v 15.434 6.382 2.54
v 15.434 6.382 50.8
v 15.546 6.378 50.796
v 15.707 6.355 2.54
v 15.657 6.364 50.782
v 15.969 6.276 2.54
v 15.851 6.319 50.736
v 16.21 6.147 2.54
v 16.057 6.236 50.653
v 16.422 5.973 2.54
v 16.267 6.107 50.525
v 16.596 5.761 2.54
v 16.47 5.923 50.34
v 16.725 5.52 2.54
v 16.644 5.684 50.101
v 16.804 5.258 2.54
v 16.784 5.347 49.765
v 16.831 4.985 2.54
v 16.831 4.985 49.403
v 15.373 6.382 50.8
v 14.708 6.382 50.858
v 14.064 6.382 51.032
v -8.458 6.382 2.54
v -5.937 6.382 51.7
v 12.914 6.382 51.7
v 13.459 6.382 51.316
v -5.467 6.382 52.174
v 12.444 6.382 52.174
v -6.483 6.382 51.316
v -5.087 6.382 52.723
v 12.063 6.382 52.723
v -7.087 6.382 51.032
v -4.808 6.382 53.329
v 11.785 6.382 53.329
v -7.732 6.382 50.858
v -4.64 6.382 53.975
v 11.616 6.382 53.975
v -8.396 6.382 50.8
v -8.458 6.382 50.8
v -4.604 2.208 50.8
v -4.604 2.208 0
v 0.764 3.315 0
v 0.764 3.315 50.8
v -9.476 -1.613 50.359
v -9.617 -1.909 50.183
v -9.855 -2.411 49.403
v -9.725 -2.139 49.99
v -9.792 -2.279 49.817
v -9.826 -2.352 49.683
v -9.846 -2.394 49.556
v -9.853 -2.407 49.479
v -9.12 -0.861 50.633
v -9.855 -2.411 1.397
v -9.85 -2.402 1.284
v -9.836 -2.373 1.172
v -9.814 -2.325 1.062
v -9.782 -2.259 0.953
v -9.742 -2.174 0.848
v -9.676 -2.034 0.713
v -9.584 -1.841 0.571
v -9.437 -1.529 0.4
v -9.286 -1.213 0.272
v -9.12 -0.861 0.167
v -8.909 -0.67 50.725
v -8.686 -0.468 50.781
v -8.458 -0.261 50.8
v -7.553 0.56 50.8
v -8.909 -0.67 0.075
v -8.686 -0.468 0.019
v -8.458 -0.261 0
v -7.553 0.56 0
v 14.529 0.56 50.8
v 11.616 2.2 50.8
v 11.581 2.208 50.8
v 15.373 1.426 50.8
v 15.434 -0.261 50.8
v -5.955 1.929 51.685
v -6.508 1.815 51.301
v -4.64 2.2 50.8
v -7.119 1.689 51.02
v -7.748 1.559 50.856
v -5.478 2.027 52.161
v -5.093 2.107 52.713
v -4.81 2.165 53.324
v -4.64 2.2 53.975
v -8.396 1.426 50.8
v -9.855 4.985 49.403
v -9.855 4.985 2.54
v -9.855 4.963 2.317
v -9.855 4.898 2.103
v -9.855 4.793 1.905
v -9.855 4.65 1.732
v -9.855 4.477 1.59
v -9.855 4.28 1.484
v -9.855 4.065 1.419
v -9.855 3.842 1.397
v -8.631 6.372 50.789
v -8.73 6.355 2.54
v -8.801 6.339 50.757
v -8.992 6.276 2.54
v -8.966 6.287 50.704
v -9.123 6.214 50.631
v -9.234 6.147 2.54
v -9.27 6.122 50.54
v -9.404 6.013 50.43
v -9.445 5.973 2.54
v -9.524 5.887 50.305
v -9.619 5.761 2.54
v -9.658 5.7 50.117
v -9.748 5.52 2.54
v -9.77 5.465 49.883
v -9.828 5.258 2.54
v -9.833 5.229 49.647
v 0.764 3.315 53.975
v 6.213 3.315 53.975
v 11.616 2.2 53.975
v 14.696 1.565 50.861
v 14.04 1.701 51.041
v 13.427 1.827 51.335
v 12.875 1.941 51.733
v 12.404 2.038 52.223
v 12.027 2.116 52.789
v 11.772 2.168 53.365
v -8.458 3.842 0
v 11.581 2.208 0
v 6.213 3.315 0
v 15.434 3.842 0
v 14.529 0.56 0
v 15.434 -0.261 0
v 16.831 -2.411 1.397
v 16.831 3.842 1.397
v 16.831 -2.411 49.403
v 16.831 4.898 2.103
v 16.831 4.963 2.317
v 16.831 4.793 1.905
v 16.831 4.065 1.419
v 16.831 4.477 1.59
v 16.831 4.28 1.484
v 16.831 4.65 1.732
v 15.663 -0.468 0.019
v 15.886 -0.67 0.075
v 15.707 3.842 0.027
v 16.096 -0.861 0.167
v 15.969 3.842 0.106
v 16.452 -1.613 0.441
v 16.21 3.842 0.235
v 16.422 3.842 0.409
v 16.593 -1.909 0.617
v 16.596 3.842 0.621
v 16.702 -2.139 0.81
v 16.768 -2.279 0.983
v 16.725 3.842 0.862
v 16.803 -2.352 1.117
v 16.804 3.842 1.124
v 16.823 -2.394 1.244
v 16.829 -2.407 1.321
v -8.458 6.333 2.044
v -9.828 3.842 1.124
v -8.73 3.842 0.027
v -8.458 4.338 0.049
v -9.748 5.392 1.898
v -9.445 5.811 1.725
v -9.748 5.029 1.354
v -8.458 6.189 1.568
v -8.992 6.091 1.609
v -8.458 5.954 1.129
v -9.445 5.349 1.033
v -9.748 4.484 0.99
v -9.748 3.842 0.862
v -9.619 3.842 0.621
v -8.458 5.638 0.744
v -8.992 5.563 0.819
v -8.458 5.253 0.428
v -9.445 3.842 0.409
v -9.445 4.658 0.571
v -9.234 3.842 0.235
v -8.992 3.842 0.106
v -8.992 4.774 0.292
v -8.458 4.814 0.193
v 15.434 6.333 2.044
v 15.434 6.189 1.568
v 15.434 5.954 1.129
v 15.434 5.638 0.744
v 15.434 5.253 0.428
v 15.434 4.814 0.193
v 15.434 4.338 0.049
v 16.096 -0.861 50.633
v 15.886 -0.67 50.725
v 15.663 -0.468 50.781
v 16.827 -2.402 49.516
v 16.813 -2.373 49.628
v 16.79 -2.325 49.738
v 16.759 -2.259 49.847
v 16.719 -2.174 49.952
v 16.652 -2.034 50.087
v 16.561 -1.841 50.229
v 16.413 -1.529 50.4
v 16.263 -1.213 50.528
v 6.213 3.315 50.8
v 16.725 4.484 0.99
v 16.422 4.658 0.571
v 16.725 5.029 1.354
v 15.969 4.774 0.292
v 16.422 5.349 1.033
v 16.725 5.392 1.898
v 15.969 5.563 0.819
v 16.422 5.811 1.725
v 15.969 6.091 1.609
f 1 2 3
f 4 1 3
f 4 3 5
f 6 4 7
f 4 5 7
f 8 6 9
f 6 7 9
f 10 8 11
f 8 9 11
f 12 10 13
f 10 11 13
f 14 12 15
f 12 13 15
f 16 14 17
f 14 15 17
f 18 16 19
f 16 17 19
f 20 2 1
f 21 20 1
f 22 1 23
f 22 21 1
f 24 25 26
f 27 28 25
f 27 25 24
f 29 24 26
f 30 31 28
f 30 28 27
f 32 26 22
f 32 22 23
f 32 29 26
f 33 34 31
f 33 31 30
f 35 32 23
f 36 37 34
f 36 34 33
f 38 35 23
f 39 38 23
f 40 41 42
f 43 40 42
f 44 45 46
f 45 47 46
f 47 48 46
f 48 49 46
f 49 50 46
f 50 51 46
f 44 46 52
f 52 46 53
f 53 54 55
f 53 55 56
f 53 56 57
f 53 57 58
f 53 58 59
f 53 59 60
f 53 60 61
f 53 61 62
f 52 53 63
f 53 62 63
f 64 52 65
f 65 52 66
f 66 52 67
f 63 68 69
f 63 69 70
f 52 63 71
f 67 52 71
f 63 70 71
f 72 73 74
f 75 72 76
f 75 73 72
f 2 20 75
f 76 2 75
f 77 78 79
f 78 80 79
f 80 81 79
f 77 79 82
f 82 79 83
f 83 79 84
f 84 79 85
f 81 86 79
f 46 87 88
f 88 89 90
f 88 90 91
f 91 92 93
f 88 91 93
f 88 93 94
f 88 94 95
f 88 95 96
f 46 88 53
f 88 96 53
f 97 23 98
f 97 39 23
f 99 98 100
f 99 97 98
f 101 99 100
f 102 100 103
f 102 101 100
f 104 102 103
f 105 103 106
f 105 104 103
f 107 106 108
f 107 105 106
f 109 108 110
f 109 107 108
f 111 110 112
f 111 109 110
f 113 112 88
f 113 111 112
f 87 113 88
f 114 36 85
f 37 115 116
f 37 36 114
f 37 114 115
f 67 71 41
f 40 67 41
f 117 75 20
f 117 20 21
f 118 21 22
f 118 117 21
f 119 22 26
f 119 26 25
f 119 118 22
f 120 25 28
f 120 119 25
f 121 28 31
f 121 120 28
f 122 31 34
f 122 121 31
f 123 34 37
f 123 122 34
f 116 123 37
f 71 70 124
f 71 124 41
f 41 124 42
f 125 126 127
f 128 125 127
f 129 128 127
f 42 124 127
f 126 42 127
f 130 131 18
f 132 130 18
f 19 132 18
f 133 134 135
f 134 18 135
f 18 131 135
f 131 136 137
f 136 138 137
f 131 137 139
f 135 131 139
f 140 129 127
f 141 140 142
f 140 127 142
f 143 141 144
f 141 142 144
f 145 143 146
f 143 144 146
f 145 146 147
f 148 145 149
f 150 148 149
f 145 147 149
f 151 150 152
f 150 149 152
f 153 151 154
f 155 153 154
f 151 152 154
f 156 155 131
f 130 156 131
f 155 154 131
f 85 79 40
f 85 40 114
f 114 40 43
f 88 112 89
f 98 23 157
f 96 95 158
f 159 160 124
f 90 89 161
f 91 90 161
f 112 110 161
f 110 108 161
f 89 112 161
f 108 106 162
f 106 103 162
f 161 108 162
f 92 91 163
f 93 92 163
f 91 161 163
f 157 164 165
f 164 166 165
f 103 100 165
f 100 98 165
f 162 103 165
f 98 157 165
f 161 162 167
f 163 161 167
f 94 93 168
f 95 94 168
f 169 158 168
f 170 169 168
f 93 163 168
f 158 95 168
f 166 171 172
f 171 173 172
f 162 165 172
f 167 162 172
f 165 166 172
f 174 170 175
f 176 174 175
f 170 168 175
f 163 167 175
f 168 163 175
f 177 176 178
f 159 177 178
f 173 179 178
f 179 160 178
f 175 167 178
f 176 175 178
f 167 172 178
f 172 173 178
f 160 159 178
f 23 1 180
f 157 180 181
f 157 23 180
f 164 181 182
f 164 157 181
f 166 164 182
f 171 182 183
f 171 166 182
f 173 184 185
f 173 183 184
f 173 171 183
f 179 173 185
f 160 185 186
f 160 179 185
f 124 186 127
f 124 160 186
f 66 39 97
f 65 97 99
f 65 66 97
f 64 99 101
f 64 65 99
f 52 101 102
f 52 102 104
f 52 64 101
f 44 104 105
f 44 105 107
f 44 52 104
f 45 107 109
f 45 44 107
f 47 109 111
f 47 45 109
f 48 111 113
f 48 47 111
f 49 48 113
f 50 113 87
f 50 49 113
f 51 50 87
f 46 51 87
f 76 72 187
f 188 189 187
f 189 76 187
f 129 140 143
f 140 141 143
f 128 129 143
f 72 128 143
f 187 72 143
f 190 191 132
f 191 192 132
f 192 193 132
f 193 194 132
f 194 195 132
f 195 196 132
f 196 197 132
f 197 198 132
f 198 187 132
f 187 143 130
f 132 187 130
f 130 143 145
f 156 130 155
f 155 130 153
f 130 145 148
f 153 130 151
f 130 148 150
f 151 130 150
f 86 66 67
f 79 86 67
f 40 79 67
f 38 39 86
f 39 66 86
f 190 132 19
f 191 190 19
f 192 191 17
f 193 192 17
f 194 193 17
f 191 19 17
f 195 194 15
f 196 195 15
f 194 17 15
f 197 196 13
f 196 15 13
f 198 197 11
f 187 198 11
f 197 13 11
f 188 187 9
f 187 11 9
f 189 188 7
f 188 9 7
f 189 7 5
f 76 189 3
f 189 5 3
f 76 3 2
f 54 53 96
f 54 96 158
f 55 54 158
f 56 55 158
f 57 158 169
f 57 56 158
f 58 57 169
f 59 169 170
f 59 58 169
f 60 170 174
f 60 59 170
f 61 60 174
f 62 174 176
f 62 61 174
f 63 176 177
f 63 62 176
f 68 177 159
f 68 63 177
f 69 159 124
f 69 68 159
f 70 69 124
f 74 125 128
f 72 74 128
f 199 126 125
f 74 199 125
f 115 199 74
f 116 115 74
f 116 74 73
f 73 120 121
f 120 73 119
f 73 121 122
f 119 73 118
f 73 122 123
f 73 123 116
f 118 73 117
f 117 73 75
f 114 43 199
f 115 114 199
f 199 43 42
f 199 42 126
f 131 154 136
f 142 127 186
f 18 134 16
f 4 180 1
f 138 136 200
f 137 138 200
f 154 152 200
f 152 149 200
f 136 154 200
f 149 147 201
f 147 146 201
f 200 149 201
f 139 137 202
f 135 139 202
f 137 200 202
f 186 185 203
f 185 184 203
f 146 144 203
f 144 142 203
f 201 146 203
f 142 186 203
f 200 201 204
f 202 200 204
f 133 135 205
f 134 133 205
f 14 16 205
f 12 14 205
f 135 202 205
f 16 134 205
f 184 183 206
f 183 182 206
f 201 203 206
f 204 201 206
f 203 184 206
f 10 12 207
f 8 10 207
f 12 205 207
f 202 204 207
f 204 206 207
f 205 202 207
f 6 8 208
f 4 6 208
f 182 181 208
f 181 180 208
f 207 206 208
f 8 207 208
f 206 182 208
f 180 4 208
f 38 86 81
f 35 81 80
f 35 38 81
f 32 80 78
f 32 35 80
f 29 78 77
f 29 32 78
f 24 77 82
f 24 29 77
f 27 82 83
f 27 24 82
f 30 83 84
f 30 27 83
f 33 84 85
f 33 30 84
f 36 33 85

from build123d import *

# Parameters (mm, degrees)
F1_DEPTH    = 50.8
F4_DEPTH    = 3.175
F5_T4_DEPTH = 13.5737083661
F5_T9_DEPTH = 13.5737083661
F6_R        = 1.397
F7_T1_DEPTH = 26.6857916153
F7_T4_ANGLE = 90
F7_T6_ANGLE = 90


# Not quite as in the source:
# - a fillet or chamfer that OpenCascade refuses, or shapes differently, is made with other operations: its cross-section is extruded or revolved along the edge and cut away or added


with BuildPart() as f1:
    # F0 (on Top) → F1 (new body)
    with BuildSketch(Plane.XY):
        Polygon((16.83116441, 6.3822651147), (-9.8546272053, 6.3822651147), (-9.8546272053, -2.4114359531), (-9.1195573698, -0.8609411879), (-7.5529336119, 0.5598957894), (-4.6044890144, 2.2076013963), (0.7639104889, 3.3147196292), (6.2126267158, 3.3147196292), (11.5810262191, 2.2076013963), (14.5294708166, 0.5598957894), (16.0960945745, -0.8609411879), (16.83116441, -2.4114359531), align=None)
    extrude(amount=F1_DEPTH)

    # F3 (on face) → F4 (join)
    with BuildSketch(Plane.XY.offset(50.8)):
        Polygon((11.6162686024, 6.3822651147), (-4.6397313976, 6.3822651147), (-4.6397313976, 2.2003334042), (0.7639104889, 3.3147196292), (6.2126267158, 3.3147196292), (11.6162686024, 2.2003334042), align=None)
    extrude(amount=F4_DEPTH)

    # F5: fillet of radius 3.81 on 2 edges, made by hand


with BuildPart() as f5_tool2:
    # F5_s3 → F5_t4 (new body)
    with BuildSketch(Plane.XZ.offset(7.1914432514)):
        with BuildLine():
            ThreePointArc((15.3729792646, 50.8), (12.9136348398, 51.7000644337), (11.6162686024, 53.975))
            Line((11.6162686024, 53.975), (11.6162686024, 50.8))
            Line((11.6162686024, 50.8), (15.3729792646, 50.8))
        make_face()
    extrude(amount=-F5_T4_DEPTH)

    split(bisect_by=Plane(origin=(0.9091488864, 4.4084491475, 0), x_dir=(0, 0, 1), z_dir=(0.2019783567, 0.9793899854, 0)), keep=Keep.TOP)


with BuildPart() as f1_1:
    add(f1.part)

    # F5_t1: union F5_tool2
    add(f5_tool2.part)


with BuildPart() as f5_tool7:
    # F5_s8 → F5_t9 (new body)
    with BuildSketch(Plane.XZ.offset(-6.3822651147)):
        with BuildLine():
            ThreePointArc((-8.3964420599, 50.8), (-5.9370976351, 51.7000644337), (-4.6397313976, 53.975))
            Line((-4.6397313976, 53.975), (-4.6397313976, 50.8))
            Line((-4.6397313976, 50.8), (-8.3964420599, 50.8))
        make_face()
    extrude(amount=F5_T9_DEPTH)

    split(bisect_by=Plane(origin=(-0.624539261, 3.0283813951, 0), x_dir=(0, 0, 1), z_dir=(-0.2019783567, 0.9793899854, 0)), keep=Keep.TOP)


with BuildPart() as f1_2:
    add(f1_1.part)

    # F5_t6: union F5_tool7
    add(f5_tool7.part)

    # F6
    f6_edges = [f1_2.edges().sort_by_distance(p)[0] for p in [
        (-9.854627, 1.985415, 50.8),
        (16.831164, 1.985415, 50.8),
        (16.831164, 1.985415, 0),
        (-9.854627, 1.985415, 0),
        (16.831164, 6.382265, 25.4),
        (-9.854627, 6.382265, 25.4),
    ]]
    fillet(f6_edges, radius=F6_R)

    # F7: fillet of radius 2.54 on 1 edges, made by hand

    # F7_s2 → F7_t1 (cut)
    with BuildSketch(Plane.YZ.offset(-9.8546272053)):
        with BuildLine():
            ThreePointArc((6.3822651147, 2.54), (5.6383163389, 0.7439487758), (3.8422651147, 0))
            Line((3.8422651147, 0), (6.3822651147, 0))
            Line((6.3822651147, 0), (6.3822651147, 2.54))
        make_face()
    extrude(amount=F7_T1_DEPTH, mode=Mode.SUBTRACT)

    # F7_s3 → F7_t4 (revolve, cut)
    with BuildSketch(Plane.XZ.offset(-3.8422651147)):
        with BuildLine():
            ThreePointArc((16.83116441, 1.397), (16.4219925833, 0.4091718267), (15.43416441, 0))
            Line((15.43416441, 0), (16.83116441, 0))
            Line((16.83116441, 0), (16.83116441, 1.397))
        make_face()
    revolve(axis=Axis((16.83116441, 3.8422651147, 2.54), (1, 0, 0)), revolution_arc=F7_T4_ANGLE, mode=Mode.SUBTRACT)

    # F7_s5 → F7_t6 (revolve, cut)
    with BuildSketch(Plane.XY.offset(2.54)):
        with BuildLine():
            ThreePointArc((-9.8546272053, 4.9852651147), (-9.4454553786, 5.973093288), (-8.4576272053, 6.3822651147))
            Line((-8.4576272053, 6.3822651147), (-9.8546272053, 6.3822651147))
            Line((-9.8546272053, 6.3822651147), (-9.8546272053, 4.9852651147))
        make_face()
    revolve(axis=Axis((-9.8546272053, 3.8422651147, 2.54), (-1, 0, 0)), revolution_arc=F7_T6_ANGLE, mode=Mode.SUBTRACT)


solid = f1_2.part
